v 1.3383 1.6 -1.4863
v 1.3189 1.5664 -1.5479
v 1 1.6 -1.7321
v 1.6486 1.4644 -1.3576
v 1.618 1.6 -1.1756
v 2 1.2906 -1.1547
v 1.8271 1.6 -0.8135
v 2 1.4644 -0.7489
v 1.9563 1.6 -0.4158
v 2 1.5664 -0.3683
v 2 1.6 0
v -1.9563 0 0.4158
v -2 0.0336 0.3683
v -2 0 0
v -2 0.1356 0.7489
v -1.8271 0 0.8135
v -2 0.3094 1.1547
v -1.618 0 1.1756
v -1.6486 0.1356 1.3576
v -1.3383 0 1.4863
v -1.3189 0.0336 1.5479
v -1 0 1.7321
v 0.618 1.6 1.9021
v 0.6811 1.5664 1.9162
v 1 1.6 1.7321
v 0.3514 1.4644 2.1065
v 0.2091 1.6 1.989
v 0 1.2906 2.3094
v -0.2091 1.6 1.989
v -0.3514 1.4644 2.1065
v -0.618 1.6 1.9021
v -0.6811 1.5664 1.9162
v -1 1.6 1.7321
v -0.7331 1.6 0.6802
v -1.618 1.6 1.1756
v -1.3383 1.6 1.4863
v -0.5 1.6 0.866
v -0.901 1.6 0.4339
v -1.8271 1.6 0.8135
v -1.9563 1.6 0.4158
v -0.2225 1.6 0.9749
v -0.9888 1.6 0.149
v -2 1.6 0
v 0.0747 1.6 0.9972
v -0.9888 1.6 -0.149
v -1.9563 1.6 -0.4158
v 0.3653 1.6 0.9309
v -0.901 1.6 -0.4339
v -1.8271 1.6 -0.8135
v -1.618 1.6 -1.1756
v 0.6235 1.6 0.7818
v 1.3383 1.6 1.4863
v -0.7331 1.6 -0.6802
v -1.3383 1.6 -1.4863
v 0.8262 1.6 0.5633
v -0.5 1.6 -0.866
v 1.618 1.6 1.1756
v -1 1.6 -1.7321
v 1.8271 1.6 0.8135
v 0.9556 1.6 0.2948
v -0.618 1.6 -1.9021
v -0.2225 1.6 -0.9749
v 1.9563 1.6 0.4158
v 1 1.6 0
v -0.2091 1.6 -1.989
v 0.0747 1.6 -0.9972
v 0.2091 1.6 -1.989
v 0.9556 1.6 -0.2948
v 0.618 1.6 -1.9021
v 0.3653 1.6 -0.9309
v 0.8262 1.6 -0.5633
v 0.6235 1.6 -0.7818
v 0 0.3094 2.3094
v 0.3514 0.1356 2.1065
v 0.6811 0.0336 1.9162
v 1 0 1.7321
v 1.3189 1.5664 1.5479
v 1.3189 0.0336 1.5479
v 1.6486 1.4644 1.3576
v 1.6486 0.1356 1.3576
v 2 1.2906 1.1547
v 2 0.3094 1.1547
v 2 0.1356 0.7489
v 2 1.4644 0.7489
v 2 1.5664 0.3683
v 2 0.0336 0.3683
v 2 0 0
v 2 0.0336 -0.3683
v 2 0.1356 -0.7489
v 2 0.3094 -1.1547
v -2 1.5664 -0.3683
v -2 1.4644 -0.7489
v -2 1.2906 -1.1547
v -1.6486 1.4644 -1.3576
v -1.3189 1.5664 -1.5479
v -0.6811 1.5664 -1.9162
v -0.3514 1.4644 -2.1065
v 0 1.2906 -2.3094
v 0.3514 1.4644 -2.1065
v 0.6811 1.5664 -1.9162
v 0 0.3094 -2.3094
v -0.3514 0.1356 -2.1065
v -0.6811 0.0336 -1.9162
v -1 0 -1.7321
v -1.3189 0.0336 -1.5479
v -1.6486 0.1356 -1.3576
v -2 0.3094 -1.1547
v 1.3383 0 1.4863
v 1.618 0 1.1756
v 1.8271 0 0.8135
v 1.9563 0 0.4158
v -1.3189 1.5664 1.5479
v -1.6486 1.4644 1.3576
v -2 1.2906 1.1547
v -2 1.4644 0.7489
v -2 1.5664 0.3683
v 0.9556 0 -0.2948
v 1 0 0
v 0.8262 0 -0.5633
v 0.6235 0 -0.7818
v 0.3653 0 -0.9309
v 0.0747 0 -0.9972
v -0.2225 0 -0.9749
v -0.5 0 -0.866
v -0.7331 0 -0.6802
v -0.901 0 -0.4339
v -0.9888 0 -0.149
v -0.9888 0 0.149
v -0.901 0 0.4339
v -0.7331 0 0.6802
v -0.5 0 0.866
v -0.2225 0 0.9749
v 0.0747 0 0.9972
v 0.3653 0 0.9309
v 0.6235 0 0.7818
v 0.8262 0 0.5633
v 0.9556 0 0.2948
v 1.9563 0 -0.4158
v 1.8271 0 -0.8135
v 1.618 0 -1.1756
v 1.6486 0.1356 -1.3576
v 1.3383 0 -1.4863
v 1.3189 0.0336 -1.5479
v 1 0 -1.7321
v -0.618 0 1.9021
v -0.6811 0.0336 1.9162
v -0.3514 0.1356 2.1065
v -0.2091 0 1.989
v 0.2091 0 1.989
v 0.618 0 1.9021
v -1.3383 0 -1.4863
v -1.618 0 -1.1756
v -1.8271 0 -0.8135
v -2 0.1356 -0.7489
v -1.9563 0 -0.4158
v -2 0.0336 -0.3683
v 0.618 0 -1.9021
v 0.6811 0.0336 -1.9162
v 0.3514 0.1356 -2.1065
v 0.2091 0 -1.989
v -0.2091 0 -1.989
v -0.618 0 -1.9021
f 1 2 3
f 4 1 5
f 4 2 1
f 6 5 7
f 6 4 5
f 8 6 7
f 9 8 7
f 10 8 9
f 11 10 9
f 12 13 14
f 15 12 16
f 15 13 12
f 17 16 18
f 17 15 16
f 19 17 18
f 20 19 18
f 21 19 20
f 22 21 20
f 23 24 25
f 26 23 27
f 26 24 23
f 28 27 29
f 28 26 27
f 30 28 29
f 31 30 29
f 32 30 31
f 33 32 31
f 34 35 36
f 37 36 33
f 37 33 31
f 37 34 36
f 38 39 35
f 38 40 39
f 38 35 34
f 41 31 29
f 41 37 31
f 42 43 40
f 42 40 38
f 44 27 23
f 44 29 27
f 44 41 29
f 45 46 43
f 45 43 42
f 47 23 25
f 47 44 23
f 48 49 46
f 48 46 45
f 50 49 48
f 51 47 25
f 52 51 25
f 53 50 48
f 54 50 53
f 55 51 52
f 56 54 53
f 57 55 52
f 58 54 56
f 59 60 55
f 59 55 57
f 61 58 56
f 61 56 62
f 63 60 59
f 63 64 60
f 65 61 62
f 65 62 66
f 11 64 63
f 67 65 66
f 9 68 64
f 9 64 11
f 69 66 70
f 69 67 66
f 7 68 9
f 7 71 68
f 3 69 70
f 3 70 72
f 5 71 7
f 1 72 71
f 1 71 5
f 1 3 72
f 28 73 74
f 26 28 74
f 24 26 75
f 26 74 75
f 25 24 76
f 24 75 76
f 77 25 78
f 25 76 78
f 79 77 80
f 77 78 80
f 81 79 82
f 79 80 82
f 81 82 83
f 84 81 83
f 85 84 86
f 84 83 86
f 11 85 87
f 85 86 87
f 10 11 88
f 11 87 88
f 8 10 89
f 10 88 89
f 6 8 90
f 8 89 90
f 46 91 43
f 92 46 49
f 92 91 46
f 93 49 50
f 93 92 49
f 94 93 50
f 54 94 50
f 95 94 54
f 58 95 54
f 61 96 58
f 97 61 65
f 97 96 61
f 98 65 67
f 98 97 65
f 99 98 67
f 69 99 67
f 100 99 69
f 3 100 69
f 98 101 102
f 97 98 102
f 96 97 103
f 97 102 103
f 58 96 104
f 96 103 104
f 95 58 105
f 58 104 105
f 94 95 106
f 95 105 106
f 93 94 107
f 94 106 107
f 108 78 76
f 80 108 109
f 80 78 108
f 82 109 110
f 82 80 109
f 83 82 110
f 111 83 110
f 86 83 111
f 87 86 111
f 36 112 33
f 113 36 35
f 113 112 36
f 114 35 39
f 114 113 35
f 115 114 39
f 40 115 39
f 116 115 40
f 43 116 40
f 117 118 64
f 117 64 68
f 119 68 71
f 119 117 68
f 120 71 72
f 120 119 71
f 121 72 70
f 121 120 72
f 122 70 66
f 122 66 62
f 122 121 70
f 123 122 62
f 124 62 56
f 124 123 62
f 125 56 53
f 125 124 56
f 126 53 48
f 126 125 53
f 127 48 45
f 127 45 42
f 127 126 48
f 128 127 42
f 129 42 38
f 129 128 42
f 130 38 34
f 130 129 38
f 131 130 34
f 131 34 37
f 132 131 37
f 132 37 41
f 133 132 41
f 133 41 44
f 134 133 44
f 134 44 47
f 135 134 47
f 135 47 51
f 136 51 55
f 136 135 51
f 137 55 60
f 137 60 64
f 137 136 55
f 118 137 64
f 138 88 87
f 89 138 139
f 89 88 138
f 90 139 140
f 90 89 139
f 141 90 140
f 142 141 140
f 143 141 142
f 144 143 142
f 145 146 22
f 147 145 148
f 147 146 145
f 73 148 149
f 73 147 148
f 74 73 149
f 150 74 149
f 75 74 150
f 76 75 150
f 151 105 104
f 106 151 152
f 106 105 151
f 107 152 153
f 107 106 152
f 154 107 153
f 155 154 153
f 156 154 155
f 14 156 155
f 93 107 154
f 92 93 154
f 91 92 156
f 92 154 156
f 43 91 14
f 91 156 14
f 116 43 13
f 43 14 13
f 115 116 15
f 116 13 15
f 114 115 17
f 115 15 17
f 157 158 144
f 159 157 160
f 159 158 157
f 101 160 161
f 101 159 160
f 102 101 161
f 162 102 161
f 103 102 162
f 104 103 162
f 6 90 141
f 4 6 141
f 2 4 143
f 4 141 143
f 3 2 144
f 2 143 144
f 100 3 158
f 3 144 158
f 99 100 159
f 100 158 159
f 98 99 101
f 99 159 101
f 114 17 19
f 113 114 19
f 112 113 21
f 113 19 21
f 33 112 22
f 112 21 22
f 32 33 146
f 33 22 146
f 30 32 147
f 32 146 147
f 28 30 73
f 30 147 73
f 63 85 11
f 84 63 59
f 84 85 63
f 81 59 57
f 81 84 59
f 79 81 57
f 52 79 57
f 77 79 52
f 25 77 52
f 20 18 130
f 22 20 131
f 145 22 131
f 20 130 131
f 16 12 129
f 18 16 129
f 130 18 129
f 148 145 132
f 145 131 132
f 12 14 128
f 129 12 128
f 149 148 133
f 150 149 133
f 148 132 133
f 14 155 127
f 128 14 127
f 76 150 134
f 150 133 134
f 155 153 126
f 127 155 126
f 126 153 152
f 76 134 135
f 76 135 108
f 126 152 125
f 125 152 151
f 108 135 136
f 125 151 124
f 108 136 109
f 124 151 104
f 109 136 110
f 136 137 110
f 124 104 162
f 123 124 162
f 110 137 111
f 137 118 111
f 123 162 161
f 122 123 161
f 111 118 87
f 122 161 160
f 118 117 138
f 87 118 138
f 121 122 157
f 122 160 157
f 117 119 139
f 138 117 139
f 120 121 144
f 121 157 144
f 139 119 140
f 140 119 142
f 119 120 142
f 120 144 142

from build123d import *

# Parameters (mm, degrees)
SKETCH1_R           = 1
BOSS_EXTRUDE1_DEPTH = 1.6
SKETCH2_OUTSIDE_W   = 12.464
SKETCH2_OUTSIDE_H   = 13.082
SKETCH2_OUTSIDE_R   = 2
CUT_EXTRUDE1_DEPTH  = 2.6
CUT_EXTRUDE1_TAPER  = 45
SKETCH3_OUTSIDE_W   = 12.464
SKETCH3_OUTSIDE_H   = 13.082
SKETCH3_OUTSIDE_R   = 2
CUT_EXTRUDE2_DEPTH  = 2.6
CUT_EXTRUDE2_TAPER  = 45


with BuildPart() as part:
    # Sketch1 → Boss-Extrude1 (new body)
    with BuildSketch(Plane(origin=(0, 0, 0), x_dir=(1, 0, 0), z_dir=(0, 1, 0))):
        Polygon((0, 2.309401077), (-2, 1.154700538), (-2, -1.154700538), (0, -2.309401077), (2, -1.154700538), (2, 1.154700538), align=None)
        Circle(SKETCH1_R, mode=Mode.SUBTRACT)
    extrude(amount=BOSS_EXTRUDE1_DEPTH)

    # Sketch2 outside → Cut-Extrude1 (cut, through all)
    with BuildSketch(Plane(origin=(0, 1.6, 0), x_dir=(1, 0, 0), z_dir=(0, 1, 0))):
        Rectangle(SKETCH2_OUTSIDE_W, SKETCH2_OUTSIDE_H)
        Circle(SKETCH2_OUTSIDE_R, mode=Mode.SUBTRACT)
    extrude(amount=-CUT_EXTRUDE1_DEPTH, taper=CUT_EXTRUDE1_TAPER, mode=Mode.SUBTRACT)

    # Sketch3 outside → Cut-Extrude2 (cut, through all)
    with BuildSketch(Plane.XZ):
        Rectangle(SKETCH3_OUTSIDE_W, SKETCH3_OUTSIDE_H)
        Circle(SKETCH3_OUTSIDE_R, mode=Mode.SUBTRACT)
    extrude(amount=-CUT_EXTRUDE2_DEPTH, taper=CUT_EXTRUDE2_TAPER, mode=Mode.SUBTRACT)


solid = part.part
